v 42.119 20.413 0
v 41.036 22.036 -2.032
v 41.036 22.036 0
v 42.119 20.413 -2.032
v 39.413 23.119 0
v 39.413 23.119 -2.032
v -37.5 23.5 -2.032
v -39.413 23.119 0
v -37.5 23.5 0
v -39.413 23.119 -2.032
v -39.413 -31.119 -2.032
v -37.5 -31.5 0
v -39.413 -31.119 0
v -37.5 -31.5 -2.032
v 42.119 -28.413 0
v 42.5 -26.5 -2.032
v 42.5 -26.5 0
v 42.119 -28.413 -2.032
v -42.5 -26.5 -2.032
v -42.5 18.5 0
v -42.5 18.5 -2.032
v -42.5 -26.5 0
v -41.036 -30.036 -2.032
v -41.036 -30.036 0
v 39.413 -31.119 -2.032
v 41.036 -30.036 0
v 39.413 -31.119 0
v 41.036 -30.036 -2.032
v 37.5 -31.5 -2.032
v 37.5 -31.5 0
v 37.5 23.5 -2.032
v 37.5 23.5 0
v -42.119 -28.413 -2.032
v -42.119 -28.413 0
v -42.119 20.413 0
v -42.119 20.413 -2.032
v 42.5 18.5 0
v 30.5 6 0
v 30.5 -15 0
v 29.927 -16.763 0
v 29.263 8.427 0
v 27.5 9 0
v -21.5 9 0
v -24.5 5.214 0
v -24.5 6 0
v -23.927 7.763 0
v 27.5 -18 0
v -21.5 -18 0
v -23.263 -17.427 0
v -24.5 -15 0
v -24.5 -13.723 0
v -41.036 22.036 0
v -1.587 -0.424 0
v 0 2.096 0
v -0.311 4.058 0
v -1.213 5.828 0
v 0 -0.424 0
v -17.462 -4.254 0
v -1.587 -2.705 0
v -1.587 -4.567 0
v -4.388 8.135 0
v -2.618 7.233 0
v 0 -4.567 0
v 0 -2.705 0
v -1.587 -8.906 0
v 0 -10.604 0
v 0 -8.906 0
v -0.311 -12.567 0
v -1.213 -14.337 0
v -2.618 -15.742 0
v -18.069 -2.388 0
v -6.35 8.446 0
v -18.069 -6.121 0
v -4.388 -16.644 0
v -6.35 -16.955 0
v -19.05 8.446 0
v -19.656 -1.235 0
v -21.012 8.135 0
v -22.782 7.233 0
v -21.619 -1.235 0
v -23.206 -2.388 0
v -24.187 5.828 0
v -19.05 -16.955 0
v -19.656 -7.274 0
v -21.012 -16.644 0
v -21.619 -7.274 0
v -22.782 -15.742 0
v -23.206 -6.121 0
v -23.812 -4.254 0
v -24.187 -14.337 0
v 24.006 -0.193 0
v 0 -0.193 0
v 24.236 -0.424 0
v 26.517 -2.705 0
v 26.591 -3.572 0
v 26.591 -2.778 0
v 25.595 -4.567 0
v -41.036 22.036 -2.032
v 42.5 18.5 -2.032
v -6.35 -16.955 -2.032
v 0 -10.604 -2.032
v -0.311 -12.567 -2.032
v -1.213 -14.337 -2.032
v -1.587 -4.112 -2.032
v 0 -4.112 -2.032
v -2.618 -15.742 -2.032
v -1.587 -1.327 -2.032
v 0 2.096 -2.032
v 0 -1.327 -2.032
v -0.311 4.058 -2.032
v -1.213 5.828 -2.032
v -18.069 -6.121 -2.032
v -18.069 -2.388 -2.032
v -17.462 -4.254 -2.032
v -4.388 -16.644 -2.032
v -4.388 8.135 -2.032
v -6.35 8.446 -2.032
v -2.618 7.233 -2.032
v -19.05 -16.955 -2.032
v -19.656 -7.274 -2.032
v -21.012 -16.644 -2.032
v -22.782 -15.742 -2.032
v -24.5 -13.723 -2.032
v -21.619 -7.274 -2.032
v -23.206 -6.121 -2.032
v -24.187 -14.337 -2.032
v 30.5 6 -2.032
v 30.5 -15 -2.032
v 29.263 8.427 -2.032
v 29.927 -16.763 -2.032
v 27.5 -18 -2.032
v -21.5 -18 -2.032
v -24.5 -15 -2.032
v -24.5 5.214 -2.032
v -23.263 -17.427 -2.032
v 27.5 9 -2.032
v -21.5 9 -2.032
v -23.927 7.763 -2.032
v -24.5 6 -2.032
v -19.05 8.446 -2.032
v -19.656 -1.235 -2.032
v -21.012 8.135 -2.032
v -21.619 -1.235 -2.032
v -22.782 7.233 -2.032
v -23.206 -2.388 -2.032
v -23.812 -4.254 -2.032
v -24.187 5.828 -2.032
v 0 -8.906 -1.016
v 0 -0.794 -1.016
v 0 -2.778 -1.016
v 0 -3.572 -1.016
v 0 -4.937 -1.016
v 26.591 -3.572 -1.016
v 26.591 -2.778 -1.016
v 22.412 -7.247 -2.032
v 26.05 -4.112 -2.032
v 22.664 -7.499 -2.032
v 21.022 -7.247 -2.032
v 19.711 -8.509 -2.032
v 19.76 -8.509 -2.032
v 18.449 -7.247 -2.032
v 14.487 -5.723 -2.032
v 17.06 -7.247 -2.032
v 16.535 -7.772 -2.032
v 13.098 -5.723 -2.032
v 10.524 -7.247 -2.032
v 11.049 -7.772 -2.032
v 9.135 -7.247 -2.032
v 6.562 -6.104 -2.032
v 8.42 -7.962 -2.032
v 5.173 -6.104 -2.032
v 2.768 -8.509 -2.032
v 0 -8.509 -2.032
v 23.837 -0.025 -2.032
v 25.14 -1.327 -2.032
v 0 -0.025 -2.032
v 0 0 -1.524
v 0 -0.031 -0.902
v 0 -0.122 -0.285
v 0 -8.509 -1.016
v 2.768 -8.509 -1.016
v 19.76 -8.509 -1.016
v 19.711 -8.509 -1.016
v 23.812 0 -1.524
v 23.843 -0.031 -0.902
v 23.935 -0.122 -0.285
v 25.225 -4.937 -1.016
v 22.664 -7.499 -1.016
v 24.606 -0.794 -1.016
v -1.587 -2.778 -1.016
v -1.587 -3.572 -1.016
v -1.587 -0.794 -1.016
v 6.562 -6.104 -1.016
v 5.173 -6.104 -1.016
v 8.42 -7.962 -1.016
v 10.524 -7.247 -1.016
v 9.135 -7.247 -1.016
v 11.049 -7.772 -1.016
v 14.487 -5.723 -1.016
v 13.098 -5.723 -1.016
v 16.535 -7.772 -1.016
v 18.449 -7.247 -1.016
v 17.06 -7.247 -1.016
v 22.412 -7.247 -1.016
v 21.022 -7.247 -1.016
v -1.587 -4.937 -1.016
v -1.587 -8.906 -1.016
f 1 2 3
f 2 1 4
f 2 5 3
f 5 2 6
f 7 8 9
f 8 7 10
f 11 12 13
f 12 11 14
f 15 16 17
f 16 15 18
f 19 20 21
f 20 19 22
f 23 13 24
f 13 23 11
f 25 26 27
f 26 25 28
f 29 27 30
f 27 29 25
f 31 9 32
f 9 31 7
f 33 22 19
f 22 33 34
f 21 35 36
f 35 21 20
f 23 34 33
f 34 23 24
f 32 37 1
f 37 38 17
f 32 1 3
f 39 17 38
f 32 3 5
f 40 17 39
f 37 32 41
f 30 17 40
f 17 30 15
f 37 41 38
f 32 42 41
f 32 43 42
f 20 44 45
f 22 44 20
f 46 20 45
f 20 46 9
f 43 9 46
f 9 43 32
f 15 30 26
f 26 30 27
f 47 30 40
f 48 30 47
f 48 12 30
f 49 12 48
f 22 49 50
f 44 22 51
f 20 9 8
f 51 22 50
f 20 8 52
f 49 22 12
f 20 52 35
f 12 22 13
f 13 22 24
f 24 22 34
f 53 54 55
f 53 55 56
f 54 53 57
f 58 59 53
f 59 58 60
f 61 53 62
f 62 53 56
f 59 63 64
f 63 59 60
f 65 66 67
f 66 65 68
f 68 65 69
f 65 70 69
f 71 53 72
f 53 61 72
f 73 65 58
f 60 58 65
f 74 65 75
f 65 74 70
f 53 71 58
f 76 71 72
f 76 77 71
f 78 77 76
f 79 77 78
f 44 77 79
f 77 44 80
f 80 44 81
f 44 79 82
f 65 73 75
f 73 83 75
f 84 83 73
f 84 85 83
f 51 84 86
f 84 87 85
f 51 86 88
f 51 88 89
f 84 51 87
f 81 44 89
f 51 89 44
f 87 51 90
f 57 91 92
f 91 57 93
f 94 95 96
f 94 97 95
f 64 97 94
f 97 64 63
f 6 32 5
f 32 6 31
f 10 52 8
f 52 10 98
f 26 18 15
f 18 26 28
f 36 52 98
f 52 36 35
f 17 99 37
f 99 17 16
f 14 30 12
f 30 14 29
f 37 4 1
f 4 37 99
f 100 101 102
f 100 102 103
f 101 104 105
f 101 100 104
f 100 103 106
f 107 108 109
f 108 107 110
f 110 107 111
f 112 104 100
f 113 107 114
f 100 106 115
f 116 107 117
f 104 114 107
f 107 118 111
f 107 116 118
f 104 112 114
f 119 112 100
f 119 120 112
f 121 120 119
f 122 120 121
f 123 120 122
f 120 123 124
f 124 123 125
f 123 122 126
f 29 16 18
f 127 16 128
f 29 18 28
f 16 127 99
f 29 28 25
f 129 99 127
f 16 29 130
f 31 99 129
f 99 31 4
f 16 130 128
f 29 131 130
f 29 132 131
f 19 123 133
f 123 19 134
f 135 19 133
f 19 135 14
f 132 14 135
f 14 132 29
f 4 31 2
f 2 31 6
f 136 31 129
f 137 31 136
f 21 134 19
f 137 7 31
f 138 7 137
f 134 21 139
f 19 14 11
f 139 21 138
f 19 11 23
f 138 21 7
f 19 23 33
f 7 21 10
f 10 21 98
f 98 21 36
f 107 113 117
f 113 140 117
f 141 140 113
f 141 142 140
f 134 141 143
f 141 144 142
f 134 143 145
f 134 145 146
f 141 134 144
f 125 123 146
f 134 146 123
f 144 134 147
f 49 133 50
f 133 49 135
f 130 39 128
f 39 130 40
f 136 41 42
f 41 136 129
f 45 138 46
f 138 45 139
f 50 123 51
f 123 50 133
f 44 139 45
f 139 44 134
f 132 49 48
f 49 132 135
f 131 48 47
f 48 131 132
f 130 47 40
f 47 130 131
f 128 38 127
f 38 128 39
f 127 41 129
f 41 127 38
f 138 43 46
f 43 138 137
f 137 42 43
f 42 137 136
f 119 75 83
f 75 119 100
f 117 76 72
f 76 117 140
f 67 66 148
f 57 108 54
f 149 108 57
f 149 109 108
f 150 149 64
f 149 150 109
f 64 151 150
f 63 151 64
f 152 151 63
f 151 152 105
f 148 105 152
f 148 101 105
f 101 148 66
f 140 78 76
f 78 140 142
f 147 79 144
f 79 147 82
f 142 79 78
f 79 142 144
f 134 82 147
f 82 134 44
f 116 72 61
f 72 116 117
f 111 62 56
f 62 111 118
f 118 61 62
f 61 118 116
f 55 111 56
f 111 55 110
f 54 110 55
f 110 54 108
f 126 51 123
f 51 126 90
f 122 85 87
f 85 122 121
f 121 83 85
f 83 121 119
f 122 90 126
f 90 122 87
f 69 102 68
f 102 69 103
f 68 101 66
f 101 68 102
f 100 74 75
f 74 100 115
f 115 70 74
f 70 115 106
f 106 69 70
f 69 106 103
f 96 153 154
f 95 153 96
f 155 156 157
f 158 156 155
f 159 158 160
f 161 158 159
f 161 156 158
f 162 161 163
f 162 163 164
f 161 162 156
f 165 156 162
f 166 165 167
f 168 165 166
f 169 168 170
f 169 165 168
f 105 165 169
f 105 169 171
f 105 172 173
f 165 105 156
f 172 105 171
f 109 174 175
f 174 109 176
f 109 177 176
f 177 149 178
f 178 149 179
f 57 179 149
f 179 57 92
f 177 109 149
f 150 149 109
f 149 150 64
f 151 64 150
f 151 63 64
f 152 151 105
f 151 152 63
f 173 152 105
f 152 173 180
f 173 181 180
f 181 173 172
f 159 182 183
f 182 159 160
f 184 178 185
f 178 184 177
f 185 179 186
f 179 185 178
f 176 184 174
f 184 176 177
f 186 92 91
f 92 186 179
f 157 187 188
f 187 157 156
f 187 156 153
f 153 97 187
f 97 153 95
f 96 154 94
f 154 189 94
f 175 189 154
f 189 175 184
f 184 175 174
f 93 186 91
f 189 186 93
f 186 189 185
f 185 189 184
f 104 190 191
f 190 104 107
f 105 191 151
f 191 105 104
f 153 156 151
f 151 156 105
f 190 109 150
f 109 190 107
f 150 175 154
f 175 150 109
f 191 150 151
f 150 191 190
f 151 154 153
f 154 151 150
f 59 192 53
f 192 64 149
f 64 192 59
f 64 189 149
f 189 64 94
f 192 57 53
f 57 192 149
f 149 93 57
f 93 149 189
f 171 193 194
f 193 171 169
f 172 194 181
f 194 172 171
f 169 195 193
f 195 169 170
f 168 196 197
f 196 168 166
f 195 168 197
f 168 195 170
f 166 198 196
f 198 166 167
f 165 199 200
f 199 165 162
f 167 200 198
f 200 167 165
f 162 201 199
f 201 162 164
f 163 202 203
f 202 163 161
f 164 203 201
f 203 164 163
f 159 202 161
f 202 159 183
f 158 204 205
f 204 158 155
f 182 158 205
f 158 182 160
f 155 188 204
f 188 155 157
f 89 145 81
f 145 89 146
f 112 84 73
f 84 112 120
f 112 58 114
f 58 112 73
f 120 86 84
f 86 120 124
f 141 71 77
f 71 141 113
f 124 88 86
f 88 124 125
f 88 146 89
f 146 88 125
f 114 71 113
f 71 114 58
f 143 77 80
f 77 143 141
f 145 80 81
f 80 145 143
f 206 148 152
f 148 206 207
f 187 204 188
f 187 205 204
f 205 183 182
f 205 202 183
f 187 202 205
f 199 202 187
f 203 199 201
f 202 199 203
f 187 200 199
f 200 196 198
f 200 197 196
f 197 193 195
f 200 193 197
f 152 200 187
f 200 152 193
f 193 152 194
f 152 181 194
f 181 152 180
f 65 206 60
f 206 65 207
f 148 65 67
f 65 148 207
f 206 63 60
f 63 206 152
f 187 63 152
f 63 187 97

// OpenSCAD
// Physical Keygen - by Nirav Patel <http://eclecti.cc>
//
// Generate a duplicate of a Schlage SC1 key by editing the last line of the file
// and entering in the key code of the lock.  If you don't know the key code,
// you can measure the key and compare the numbers at:
// http://web.archive.org/web/20050217020917fw_/http://dlaco.com/spacing/tips.htm
//
// This work is licensed under a Creative Commons Attribution 3.0 Unported License.

// Since the keys and locks I have were all designed in imperial units, the
// constants in this file will be defined in inches.  The mm function
// allows us to retain the proper size for exporting a metric STL.

// Thanks to Roidzo - Easy Key Copier for help with the Customizer comments http://www.thingiverse.com/thing:52363

// preview[view:south, tilt:side]

//(this is just a reference table to help pick cuts below)
distance_from_cut_to_bottom_of_key = 0; // [0:0 = .335",1:1 = .320",2:2 = .305",3:3 = .290",4:4 = .275",5:5 = .260",6:6 = .245",7:7 = .230",8:8 = .215",9:9 = .200"]

//(cut closest to tip of key)
cut_1 = 2; //[0:9]

//
cut_2 = 2; //[0:9]

//
cut_3 = 6; //[0:9]

//
cut_4 = 2; //[0:9]

//(cut closest to grip/bow of key)
cut_5 = 5; //[0:9]

//(Rotate key flat for printing)
rotate_flat=1; //[0:No,1:Yes]

//(Put key in credit card)
credit_card=1; //[0:No,1:Yes]

function mm(i) = i*25.4;

module rounded(size, r) {
  union() {
    translate([r, 0, 0]) cube([size[0]-2*r, size[1], size[2]]);
    translate([0, r, 0]) cube([size[0], size[1]-2*r, size[2]]);
    translate([r, r, 0]) cylinder(h=size[2], r=r);
    translate([size[0]-r, r, 0]) cylinder(h=size[2], r=r);
    translate([r, size[1]-r, 0]) cylinder(h=size[2], r=r);
    translate([size[0]-r, size[1]-r, 0]) cylinder(h=size[2], r=r);
  }
}

module bit() {
  w = mm(1/4);
  difference() {
    translate([-w/2, 0, 0]) cube([w, mm(1), w]);
    translate([-mm(7/256), 0, 0]) rotate([0, 0, 135]) cube([w, w, w]);
    translate([mm(7/256), 0, 0]) rotate([0, 0, -45]) cube([w, w, w]);
  }
}

// Schlage SC1 5 pin key.  The measurements are mostly guesses based on reverse
// engineering some keys I have and some publicly available information.
module sc1(bits) {
  // You may need to adjust these to fit your specific printer settings
  thickness = mm(0.080);
  length = mm(17/16);
  width = mm(.335);
  
  shoulder = mm(.231);
  pin_spacing = mm(.156);
  depth_inc = mm(.015);
  
  // A fudge factor.  Printing with your average RepRap, the bottom layer is
  // going to be squeezed larger than you want. You can make the pins
  // go slighly deeper by a fudge amount to make up for it if you aren't
  // adjusting for it elsewhere like Skeinforge or in your firmware.
  // 0.5mm works well for me.
  fudge = 0.5;
  

  /*
   *  Credit Card Part
   */
  if (credit_card==1){
    difference(){

    // The Card
    translate([0,4]){
      linear_extrude(height=mm(0.080))offset(r=5)
      square([75, 45], center=true);
    }

    // The empty space in the card
    translate([-21.5,-6]){
      linear_extrude(height=mm(0.080))offset(r=3)
      square([49, 21]);
    }
    }
  }
  // Handle size
  h_l = mm(1);
  h_w = mm(1);
  h_d = mm(1/16);
  difference() {
    // blade and key handle
    union() {
      translate([-h_l, -h_w/2 + width/2, 0]) rounded([h_l, h_w, thickness], mm(1/4));
      intersection() {
        // cut a little off the tip to avoid going too long
        cube([length - mm(1/64), width, thickness]);
        translate([0, mm(1/4), thickness*3/4]) rotate([0, 90, 0]) cylinder(h=length, r=mm(1/4), $fn=64);
      }
    }
    
    // chamfer the tip
    translate([length, mm(1/8), 0]) {
      rotate([0, 0, 45]) cube([10, 10, thickness]);
      rotate([0, 0, 225]) cube([10, 10, thickness]);
    }
    
    // put in a hole for keychain use
    translate([-h_l + mm(3/16), width/2, 0]) cylinder(h=thickness, r=mm(1/8));
    
    // cut the channels in the key.  designed more for printability than accuracy
    union() {
      translate([-h_d, mm(9/64), thickness/2]) rotate([62, 0, 0]) cube([length + h_d, width, width]);
      translate([-h_d, mm(7/64), thickness/2]) rotate([55, 0, 0]) cube([length + h_d, width, width]);
      translate([-h_d, mm(7/64), thickness/2]) cube([length + h_d, mm(1/32), width]);
    }
    
    translate([-h_d, width - mm(9/64), 0]) cube([length + h_d, width - (width - mm(10/64)), thickness/2]);
    translate([-h_d, width - mm(9/64), thickness/2]) rotate([-110, 0, 0]) cube([length + h_d, width, thickness/2]);
    
    intersection() {
      translate([-h_d, mm(1/32), thickness/2]) rotate([-118, 0, 0]) cube([length + h_d, width, width]);
      translate([-h_d, mm(1/32), thickness/2]) rotate([-110, 0, 0]) cube([length + h_d, width, width]);
    }
    
    // Do the actual bitting
    for (b = [0:4]) {
      translate([shoulder + b*pin_spacing, width - bits[b]*depth_inc - fudge, 0]) bit();
    }
  }
}

// This sample key goes to a lock that is sitting disassembled on my desk
// Flip the key over for easy printing
if (rotate_flat==1){
  rotate([180,0,0]) sc1([cut_5,cut_4,cut_3,cut_2,cut_1]);
  } else {
    rotate([90,0,0]) sc1([cut_5,cut_4,cut_3,cut_2,cut_1]);
  }
